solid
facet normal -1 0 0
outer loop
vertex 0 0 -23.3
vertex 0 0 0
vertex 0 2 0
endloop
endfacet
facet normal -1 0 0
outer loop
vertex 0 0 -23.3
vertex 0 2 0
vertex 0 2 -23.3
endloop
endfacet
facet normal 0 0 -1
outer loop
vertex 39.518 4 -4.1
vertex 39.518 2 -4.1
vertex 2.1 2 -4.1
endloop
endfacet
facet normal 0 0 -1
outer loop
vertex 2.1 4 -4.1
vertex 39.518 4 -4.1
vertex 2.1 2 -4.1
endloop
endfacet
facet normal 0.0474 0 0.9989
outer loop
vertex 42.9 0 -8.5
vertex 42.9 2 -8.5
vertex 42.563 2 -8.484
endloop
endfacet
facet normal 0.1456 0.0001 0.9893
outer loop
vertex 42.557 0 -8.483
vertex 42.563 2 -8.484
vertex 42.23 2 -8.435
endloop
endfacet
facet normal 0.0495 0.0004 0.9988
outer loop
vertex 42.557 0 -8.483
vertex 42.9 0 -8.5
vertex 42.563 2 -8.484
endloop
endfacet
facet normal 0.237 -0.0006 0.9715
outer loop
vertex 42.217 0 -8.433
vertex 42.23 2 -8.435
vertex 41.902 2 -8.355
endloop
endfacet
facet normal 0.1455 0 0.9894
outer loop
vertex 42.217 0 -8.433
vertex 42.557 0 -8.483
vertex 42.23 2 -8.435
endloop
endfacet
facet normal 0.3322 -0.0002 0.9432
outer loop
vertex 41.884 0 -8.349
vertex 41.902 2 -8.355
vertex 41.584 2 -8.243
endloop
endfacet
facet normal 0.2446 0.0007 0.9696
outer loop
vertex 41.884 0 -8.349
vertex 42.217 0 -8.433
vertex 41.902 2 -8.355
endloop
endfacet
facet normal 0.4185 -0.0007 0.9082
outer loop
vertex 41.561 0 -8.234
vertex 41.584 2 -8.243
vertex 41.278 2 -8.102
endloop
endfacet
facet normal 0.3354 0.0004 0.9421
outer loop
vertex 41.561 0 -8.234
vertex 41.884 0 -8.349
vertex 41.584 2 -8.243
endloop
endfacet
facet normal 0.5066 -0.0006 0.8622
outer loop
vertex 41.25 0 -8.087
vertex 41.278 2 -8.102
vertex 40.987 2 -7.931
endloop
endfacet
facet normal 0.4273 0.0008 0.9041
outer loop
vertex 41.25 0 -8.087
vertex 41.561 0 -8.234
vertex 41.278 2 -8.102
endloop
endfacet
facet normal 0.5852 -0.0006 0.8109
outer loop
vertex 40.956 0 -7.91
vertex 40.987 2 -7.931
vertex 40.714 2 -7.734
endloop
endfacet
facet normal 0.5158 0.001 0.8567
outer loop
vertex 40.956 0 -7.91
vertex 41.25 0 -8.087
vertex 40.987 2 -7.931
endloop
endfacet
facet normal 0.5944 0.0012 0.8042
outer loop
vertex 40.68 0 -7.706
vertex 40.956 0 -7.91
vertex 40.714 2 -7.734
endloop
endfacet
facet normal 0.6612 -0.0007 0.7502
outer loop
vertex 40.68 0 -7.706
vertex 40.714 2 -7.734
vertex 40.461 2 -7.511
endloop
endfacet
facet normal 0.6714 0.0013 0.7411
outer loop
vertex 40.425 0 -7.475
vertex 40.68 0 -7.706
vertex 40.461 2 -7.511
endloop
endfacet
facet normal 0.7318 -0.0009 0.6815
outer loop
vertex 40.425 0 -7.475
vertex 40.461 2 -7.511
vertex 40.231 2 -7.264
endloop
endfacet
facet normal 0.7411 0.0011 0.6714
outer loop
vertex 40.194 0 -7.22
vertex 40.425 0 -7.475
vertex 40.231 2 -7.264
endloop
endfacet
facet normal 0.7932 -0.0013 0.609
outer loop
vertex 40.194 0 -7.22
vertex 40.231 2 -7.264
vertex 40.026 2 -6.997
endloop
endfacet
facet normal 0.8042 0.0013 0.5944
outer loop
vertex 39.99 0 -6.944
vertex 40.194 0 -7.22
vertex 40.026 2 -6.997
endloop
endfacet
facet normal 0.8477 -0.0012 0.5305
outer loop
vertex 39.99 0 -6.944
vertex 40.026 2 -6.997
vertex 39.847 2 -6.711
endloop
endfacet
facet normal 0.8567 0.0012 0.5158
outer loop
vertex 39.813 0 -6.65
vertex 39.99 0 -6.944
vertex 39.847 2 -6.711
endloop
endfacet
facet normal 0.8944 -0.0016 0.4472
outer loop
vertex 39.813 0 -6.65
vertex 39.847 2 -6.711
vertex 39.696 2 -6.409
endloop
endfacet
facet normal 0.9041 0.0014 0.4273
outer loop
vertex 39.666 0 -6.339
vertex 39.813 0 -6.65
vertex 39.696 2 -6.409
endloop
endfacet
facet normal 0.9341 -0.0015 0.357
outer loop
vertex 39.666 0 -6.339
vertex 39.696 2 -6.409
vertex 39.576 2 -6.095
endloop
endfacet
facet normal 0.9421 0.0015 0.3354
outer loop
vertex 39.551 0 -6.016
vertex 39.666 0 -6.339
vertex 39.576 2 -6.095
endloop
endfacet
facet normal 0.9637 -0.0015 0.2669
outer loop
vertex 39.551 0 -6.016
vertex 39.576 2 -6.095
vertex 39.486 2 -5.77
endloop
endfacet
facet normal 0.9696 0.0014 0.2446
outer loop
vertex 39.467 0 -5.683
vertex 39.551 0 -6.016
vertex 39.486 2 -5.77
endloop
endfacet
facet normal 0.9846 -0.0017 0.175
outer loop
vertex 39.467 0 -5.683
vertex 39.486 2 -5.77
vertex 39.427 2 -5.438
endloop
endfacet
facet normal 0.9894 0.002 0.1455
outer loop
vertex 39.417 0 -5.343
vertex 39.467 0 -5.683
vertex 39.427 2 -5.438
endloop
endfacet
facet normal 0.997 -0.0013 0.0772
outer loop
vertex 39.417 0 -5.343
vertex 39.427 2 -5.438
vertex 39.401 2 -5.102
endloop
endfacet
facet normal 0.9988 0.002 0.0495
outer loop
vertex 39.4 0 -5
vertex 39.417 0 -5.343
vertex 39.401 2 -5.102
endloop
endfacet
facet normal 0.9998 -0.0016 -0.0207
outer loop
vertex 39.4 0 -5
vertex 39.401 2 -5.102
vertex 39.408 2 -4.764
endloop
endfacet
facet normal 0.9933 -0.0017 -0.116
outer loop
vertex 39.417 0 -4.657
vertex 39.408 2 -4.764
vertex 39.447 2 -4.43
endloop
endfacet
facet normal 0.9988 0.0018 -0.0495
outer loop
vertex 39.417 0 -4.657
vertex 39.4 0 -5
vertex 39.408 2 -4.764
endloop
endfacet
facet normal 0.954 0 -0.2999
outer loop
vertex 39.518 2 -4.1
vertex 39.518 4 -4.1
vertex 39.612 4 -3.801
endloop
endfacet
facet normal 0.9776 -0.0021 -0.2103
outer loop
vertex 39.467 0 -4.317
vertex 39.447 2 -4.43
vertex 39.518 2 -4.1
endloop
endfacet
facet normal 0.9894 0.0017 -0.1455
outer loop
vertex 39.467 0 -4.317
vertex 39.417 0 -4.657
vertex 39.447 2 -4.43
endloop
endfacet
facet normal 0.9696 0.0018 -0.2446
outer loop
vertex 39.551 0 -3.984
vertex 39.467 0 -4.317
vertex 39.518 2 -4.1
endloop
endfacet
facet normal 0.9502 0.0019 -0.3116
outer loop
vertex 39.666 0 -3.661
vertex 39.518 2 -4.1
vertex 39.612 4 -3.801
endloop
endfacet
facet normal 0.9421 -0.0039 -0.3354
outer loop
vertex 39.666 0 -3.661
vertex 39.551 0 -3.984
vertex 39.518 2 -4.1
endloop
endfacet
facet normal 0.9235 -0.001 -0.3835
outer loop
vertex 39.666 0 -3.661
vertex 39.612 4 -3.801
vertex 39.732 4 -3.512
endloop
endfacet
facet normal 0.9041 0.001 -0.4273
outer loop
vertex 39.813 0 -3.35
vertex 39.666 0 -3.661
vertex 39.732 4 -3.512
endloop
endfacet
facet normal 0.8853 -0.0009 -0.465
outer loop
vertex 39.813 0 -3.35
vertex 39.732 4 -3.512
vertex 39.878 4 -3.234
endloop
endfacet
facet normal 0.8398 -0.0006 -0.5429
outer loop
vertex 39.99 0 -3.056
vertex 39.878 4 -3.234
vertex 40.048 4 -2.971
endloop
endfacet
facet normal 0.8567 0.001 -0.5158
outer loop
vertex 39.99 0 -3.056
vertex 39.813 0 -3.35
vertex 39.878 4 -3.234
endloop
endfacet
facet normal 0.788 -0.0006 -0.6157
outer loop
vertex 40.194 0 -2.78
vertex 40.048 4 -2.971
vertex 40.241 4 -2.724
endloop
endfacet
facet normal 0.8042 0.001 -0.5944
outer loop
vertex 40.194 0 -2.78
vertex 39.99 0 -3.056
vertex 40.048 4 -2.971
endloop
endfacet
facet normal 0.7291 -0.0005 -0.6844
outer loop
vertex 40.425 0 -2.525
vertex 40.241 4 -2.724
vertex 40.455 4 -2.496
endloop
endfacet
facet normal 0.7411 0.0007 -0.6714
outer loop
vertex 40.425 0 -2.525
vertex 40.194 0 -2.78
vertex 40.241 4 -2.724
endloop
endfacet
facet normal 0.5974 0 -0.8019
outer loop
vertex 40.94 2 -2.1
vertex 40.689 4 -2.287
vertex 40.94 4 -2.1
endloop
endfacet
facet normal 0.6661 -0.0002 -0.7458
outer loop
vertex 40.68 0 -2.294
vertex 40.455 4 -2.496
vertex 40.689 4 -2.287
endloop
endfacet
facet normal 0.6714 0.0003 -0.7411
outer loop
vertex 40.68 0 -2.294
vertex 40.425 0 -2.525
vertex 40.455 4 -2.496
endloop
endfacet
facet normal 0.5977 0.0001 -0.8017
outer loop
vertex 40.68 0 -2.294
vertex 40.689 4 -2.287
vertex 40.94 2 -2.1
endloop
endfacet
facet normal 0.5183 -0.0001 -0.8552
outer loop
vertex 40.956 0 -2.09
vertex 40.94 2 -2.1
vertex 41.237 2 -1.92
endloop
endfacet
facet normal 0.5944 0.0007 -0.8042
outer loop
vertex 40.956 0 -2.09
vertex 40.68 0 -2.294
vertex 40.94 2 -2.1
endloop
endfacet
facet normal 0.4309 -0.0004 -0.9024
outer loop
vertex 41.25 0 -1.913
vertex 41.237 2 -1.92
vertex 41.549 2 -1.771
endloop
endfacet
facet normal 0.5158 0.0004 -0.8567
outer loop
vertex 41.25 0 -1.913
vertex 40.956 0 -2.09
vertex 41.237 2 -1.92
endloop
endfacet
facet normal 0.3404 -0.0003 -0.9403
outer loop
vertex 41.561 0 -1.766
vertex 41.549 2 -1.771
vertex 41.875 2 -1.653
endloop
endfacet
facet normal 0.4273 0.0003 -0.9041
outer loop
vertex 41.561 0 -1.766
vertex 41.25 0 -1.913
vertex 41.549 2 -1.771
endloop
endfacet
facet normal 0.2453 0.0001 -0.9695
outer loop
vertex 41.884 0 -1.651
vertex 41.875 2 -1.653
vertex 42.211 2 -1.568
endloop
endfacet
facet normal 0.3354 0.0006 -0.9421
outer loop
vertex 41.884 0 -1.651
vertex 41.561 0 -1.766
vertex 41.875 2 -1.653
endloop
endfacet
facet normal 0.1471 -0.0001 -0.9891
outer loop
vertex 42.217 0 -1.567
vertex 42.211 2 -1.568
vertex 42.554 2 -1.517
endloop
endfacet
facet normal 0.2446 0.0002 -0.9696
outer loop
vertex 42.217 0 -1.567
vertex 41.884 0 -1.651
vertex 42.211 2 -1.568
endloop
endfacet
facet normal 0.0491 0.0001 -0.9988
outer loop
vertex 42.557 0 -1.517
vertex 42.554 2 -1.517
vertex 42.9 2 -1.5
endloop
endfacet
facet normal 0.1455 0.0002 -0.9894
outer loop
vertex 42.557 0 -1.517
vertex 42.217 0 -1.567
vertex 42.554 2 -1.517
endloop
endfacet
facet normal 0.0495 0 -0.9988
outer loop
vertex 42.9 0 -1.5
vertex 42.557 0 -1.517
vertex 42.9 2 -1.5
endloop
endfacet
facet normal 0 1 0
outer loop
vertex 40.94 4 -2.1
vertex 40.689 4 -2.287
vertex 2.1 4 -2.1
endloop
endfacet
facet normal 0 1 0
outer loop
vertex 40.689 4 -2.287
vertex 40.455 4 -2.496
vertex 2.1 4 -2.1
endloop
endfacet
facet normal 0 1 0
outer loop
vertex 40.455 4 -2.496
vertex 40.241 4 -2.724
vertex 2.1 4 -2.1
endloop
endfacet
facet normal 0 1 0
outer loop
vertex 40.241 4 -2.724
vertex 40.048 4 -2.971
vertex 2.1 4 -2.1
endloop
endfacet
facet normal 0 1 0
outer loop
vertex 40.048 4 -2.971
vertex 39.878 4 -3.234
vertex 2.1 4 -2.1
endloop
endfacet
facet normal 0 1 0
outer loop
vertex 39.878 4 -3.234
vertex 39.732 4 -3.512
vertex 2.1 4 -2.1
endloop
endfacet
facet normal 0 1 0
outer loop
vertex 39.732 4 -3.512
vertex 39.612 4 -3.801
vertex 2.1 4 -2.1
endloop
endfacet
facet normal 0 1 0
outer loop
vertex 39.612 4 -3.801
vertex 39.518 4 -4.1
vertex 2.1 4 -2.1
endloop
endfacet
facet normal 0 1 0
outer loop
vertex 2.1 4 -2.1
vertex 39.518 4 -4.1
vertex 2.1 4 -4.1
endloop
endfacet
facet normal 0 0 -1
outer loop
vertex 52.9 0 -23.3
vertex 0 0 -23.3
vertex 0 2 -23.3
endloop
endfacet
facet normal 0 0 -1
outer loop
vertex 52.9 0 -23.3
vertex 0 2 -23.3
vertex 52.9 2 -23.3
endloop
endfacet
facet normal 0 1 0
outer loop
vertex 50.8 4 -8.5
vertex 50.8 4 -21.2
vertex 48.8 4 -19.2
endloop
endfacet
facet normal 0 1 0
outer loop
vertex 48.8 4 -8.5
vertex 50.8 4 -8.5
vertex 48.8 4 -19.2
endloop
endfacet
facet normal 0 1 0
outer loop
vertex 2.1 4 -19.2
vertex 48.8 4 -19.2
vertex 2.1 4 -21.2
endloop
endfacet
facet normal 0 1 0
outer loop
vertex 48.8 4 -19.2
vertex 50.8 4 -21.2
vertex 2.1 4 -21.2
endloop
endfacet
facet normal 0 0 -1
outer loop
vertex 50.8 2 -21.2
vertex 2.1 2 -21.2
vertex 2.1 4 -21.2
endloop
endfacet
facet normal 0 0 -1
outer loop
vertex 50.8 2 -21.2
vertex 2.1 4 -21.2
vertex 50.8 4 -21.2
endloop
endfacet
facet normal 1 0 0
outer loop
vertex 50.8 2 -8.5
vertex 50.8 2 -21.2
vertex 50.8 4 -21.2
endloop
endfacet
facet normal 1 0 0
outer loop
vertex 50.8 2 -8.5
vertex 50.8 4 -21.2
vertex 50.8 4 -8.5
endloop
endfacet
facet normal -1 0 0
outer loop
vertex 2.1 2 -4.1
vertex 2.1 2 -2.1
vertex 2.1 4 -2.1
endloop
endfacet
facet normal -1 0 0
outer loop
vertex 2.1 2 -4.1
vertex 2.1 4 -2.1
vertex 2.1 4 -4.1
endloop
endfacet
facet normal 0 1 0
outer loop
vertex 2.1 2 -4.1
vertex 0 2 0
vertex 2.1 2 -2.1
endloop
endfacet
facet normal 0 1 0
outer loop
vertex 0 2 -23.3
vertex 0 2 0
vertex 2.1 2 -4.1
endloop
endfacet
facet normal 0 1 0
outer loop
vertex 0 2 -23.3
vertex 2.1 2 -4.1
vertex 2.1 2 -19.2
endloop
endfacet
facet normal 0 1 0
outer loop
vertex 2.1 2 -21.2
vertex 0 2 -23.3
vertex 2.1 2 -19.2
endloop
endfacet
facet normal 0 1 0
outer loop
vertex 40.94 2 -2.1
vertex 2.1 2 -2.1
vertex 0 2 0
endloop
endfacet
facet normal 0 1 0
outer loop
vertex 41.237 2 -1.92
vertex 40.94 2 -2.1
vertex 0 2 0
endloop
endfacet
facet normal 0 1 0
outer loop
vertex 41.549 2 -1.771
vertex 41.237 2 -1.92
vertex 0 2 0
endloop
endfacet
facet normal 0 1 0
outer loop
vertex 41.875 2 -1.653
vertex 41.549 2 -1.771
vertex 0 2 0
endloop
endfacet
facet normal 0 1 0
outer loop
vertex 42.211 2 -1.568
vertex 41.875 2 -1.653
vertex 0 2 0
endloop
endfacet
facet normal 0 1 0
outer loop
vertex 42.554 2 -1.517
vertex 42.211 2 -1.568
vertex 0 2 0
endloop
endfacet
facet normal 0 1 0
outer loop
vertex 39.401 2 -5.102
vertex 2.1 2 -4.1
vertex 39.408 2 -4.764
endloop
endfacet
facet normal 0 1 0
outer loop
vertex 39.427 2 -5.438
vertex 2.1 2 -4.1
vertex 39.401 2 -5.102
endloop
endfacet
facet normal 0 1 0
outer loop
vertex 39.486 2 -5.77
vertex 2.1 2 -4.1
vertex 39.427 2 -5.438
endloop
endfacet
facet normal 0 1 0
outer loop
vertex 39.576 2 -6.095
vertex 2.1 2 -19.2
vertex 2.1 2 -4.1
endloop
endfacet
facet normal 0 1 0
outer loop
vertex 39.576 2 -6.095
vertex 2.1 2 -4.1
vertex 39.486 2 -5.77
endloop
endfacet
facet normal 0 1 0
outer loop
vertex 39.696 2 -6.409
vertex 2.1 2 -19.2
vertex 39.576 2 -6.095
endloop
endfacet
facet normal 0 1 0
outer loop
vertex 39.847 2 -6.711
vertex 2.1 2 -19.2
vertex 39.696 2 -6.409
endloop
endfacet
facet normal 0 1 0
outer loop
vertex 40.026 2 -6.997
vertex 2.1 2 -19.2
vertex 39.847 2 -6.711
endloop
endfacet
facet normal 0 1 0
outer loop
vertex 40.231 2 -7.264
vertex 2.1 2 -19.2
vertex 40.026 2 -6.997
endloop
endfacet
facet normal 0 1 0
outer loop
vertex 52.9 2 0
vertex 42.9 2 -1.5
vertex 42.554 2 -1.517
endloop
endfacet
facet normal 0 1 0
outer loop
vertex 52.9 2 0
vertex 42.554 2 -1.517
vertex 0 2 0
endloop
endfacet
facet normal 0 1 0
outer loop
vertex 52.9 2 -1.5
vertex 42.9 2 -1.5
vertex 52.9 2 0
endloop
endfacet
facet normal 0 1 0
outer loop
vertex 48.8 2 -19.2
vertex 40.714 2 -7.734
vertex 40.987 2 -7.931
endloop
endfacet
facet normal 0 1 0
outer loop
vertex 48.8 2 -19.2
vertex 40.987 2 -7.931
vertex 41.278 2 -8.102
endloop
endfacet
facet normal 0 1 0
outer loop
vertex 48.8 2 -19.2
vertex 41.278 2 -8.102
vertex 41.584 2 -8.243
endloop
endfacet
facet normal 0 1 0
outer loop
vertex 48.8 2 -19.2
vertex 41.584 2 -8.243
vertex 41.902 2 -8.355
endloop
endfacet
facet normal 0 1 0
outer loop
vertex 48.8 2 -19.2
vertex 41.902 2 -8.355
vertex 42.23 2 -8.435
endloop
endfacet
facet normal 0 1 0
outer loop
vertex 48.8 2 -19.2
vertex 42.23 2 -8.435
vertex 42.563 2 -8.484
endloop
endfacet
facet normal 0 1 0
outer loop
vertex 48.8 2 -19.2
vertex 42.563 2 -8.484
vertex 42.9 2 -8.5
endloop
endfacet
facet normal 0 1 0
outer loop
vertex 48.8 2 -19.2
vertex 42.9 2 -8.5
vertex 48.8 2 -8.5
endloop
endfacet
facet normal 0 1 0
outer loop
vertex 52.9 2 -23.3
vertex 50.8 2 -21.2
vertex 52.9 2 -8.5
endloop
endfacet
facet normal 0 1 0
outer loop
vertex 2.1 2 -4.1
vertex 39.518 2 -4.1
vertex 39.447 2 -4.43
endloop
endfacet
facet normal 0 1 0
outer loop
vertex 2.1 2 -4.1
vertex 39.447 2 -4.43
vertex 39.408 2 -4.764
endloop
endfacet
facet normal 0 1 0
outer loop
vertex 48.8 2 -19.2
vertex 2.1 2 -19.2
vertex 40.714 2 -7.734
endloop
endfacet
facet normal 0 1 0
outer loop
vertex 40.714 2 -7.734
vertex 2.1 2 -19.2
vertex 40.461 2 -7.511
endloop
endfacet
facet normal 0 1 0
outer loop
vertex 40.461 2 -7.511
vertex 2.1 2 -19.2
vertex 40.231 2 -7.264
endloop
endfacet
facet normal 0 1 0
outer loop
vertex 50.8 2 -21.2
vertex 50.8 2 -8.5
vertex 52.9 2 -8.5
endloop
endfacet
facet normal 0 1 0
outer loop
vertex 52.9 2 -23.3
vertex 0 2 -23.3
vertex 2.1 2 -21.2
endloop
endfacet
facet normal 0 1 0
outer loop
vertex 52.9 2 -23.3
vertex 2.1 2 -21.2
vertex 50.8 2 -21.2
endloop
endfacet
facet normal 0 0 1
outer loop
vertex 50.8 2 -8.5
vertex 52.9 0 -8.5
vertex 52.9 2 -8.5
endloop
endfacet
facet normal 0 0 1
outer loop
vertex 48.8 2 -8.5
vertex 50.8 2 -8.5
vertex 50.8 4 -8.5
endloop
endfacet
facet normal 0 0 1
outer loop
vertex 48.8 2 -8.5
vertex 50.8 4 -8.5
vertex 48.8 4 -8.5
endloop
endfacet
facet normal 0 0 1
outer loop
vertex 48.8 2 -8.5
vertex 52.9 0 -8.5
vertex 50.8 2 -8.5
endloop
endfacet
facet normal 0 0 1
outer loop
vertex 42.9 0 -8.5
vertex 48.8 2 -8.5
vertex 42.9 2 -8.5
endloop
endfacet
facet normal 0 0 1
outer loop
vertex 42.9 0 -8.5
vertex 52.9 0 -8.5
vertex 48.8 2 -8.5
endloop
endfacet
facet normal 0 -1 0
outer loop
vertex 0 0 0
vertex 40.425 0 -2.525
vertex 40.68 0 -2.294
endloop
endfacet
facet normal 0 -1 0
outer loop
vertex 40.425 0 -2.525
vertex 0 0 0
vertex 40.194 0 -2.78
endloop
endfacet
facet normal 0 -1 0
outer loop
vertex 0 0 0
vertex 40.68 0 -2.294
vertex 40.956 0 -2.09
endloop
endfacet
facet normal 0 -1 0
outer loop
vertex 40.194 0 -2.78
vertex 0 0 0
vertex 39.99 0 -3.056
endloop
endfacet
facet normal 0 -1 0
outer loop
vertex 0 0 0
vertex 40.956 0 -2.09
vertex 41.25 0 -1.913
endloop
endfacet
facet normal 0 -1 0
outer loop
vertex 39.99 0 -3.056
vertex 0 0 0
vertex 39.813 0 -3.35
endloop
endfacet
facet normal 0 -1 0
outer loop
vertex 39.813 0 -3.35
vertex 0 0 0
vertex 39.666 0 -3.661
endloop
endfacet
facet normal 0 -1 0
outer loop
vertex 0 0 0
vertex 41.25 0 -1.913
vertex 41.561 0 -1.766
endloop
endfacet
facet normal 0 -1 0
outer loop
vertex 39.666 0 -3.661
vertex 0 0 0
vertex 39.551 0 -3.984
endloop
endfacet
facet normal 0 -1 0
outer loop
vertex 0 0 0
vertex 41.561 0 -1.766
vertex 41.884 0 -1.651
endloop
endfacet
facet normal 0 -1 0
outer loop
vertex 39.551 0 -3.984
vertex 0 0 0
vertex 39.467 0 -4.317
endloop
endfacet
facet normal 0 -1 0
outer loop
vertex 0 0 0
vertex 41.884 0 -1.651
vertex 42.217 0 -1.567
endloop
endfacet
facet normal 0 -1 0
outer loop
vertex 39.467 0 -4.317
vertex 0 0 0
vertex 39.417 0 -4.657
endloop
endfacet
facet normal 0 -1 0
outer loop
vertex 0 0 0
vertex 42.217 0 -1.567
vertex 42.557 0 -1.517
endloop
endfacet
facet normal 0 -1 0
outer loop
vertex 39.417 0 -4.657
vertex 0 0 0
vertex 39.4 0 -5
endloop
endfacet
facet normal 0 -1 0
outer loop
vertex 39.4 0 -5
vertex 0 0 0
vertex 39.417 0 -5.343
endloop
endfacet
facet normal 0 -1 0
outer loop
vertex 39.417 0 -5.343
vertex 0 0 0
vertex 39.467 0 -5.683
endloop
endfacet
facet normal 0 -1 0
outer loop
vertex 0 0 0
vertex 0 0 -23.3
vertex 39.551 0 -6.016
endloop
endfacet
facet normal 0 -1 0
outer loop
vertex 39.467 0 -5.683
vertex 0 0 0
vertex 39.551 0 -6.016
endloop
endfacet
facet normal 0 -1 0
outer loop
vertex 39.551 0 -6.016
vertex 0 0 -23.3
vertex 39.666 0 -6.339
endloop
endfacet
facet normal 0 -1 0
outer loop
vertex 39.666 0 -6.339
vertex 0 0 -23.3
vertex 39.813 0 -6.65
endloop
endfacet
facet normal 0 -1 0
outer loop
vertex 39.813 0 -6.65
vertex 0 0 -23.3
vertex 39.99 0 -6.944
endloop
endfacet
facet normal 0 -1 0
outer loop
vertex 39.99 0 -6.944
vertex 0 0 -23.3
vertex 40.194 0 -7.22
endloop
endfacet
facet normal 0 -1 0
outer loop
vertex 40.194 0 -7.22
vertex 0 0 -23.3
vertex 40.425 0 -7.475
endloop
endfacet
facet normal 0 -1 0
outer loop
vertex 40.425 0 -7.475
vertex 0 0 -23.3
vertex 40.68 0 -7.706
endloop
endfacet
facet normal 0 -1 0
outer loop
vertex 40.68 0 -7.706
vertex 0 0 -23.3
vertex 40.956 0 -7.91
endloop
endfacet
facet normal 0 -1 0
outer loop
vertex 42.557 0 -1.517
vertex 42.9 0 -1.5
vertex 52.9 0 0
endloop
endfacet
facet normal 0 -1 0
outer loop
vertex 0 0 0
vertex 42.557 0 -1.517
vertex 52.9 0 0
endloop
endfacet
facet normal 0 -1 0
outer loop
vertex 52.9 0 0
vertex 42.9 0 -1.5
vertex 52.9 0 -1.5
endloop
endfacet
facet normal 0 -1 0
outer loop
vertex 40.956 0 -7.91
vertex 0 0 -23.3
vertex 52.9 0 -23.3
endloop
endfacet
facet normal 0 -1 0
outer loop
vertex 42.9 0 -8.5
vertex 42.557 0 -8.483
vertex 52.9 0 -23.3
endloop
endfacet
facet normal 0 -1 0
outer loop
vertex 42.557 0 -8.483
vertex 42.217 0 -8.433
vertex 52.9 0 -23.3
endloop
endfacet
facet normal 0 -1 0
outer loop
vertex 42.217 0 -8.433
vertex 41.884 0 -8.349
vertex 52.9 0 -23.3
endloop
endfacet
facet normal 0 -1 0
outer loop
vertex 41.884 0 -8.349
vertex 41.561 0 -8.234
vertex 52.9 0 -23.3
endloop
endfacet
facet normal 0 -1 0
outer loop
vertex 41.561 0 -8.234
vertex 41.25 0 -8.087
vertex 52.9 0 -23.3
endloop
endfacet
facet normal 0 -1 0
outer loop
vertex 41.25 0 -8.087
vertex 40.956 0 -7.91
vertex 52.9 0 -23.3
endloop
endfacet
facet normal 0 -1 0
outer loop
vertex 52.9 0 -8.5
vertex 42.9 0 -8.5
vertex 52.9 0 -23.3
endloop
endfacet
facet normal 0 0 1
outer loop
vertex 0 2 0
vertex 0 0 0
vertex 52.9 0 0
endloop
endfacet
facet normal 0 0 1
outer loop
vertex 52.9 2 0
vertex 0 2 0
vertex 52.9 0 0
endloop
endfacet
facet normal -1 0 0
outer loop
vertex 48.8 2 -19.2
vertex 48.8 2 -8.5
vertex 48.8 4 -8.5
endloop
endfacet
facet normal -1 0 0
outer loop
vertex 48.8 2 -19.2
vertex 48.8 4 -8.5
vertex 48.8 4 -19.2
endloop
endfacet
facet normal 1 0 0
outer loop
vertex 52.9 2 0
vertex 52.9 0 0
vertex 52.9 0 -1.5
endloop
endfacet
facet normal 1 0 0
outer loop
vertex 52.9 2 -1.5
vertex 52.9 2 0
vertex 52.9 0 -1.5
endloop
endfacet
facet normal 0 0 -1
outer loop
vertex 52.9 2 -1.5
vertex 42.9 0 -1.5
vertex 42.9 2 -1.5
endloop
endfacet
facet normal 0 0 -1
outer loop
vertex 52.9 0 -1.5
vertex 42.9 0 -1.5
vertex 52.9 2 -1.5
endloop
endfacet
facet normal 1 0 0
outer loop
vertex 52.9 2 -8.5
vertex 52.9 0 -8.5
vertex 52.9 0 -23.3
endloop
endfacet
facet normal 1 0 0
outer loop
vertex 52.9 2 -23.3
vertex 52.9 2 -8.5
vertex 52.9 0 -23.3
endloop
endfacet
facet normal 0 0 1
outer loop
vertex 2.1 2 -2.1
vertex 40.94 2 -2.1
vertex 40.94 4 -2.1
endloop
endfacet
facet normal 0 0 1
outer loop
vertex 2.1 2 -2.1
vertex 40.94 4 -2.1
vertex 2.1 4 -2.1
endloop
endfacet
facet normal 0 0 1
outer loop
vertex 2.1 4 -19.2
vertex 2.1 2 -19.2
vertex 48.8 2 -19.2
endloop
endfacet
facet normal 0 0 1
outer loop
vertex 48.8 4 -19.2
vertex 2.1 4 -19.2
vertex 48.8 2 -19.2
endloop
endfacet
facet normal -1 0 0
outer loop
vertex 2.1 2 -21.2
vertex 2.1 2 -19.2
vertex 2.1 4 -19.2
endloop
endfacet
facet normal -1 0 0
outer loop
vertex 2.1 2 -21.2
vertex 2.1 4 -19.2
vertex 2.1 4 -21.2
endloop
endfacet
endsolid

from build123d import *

# Parameters (mm, degrees)
SKETCH1_W           = 52.9
SKETCH1_H           = 23.3
BOSS_EXTRUDE1_DEPTH = 2
BOSS_EXTRUDE2_DEPTH = 2
CUT_EXTRUDE1_DEPTH  = 5


with BuildPart() as part:
    # Sketch1 → Boss-Extrude1 (new body)
    with BuildSketch(Plane(origin=(0, 0, 0), x_dir=(1, 0, 0), z_dir=(0, 1, 0))):
        with Locations((26.45, 11.65)):
            Rectangle(SKETCH1_W, SKETCH1_H)
    extrude(amount=BOSS_EXTRUDE1_DEPTH)

    # Sketch2 → Boss-Extrude2 (add)
    with BuildSketch(Plane(origin=(0, 2, 0), x_dir=(1, 0, 0), z_dir=(0, 1, 0))):
        Polygon((2.1, 21.2), (50.8, 21.2), (50.8, 2.1), (2.1, 2.1), (2.1, 4.1), (4.1, 4.1), (48.8, 4.1), (48.8, 19.2), (4.1, 19.2), (2.1, 19.2), align=None)
    extrude(amount=BOSS_EXTRUDE2_DEPTH)

    # Sketch3 → Cut-Extrude1 (cut, through all)
    with BuildSketch(Plane.XZ):
        with BuildLine():
            Line((42.9, -1.5), (53.235207038, -1.5))
            ThreePointArc((53.235207038, -1.5), (56.735207038, -5), (53.235207038, -8.5))
            Line((53.235207038, -8.5), (42.9, -8.5))
            ThreePointArc((42.9, -8.5), (39.4, -5), (42.9, -1.5))
        make_face()
    extrude(amount=-CUT_EXTRUDE1_DEPTH, mode=Mode.SUBTRACT)


solid = part.part
